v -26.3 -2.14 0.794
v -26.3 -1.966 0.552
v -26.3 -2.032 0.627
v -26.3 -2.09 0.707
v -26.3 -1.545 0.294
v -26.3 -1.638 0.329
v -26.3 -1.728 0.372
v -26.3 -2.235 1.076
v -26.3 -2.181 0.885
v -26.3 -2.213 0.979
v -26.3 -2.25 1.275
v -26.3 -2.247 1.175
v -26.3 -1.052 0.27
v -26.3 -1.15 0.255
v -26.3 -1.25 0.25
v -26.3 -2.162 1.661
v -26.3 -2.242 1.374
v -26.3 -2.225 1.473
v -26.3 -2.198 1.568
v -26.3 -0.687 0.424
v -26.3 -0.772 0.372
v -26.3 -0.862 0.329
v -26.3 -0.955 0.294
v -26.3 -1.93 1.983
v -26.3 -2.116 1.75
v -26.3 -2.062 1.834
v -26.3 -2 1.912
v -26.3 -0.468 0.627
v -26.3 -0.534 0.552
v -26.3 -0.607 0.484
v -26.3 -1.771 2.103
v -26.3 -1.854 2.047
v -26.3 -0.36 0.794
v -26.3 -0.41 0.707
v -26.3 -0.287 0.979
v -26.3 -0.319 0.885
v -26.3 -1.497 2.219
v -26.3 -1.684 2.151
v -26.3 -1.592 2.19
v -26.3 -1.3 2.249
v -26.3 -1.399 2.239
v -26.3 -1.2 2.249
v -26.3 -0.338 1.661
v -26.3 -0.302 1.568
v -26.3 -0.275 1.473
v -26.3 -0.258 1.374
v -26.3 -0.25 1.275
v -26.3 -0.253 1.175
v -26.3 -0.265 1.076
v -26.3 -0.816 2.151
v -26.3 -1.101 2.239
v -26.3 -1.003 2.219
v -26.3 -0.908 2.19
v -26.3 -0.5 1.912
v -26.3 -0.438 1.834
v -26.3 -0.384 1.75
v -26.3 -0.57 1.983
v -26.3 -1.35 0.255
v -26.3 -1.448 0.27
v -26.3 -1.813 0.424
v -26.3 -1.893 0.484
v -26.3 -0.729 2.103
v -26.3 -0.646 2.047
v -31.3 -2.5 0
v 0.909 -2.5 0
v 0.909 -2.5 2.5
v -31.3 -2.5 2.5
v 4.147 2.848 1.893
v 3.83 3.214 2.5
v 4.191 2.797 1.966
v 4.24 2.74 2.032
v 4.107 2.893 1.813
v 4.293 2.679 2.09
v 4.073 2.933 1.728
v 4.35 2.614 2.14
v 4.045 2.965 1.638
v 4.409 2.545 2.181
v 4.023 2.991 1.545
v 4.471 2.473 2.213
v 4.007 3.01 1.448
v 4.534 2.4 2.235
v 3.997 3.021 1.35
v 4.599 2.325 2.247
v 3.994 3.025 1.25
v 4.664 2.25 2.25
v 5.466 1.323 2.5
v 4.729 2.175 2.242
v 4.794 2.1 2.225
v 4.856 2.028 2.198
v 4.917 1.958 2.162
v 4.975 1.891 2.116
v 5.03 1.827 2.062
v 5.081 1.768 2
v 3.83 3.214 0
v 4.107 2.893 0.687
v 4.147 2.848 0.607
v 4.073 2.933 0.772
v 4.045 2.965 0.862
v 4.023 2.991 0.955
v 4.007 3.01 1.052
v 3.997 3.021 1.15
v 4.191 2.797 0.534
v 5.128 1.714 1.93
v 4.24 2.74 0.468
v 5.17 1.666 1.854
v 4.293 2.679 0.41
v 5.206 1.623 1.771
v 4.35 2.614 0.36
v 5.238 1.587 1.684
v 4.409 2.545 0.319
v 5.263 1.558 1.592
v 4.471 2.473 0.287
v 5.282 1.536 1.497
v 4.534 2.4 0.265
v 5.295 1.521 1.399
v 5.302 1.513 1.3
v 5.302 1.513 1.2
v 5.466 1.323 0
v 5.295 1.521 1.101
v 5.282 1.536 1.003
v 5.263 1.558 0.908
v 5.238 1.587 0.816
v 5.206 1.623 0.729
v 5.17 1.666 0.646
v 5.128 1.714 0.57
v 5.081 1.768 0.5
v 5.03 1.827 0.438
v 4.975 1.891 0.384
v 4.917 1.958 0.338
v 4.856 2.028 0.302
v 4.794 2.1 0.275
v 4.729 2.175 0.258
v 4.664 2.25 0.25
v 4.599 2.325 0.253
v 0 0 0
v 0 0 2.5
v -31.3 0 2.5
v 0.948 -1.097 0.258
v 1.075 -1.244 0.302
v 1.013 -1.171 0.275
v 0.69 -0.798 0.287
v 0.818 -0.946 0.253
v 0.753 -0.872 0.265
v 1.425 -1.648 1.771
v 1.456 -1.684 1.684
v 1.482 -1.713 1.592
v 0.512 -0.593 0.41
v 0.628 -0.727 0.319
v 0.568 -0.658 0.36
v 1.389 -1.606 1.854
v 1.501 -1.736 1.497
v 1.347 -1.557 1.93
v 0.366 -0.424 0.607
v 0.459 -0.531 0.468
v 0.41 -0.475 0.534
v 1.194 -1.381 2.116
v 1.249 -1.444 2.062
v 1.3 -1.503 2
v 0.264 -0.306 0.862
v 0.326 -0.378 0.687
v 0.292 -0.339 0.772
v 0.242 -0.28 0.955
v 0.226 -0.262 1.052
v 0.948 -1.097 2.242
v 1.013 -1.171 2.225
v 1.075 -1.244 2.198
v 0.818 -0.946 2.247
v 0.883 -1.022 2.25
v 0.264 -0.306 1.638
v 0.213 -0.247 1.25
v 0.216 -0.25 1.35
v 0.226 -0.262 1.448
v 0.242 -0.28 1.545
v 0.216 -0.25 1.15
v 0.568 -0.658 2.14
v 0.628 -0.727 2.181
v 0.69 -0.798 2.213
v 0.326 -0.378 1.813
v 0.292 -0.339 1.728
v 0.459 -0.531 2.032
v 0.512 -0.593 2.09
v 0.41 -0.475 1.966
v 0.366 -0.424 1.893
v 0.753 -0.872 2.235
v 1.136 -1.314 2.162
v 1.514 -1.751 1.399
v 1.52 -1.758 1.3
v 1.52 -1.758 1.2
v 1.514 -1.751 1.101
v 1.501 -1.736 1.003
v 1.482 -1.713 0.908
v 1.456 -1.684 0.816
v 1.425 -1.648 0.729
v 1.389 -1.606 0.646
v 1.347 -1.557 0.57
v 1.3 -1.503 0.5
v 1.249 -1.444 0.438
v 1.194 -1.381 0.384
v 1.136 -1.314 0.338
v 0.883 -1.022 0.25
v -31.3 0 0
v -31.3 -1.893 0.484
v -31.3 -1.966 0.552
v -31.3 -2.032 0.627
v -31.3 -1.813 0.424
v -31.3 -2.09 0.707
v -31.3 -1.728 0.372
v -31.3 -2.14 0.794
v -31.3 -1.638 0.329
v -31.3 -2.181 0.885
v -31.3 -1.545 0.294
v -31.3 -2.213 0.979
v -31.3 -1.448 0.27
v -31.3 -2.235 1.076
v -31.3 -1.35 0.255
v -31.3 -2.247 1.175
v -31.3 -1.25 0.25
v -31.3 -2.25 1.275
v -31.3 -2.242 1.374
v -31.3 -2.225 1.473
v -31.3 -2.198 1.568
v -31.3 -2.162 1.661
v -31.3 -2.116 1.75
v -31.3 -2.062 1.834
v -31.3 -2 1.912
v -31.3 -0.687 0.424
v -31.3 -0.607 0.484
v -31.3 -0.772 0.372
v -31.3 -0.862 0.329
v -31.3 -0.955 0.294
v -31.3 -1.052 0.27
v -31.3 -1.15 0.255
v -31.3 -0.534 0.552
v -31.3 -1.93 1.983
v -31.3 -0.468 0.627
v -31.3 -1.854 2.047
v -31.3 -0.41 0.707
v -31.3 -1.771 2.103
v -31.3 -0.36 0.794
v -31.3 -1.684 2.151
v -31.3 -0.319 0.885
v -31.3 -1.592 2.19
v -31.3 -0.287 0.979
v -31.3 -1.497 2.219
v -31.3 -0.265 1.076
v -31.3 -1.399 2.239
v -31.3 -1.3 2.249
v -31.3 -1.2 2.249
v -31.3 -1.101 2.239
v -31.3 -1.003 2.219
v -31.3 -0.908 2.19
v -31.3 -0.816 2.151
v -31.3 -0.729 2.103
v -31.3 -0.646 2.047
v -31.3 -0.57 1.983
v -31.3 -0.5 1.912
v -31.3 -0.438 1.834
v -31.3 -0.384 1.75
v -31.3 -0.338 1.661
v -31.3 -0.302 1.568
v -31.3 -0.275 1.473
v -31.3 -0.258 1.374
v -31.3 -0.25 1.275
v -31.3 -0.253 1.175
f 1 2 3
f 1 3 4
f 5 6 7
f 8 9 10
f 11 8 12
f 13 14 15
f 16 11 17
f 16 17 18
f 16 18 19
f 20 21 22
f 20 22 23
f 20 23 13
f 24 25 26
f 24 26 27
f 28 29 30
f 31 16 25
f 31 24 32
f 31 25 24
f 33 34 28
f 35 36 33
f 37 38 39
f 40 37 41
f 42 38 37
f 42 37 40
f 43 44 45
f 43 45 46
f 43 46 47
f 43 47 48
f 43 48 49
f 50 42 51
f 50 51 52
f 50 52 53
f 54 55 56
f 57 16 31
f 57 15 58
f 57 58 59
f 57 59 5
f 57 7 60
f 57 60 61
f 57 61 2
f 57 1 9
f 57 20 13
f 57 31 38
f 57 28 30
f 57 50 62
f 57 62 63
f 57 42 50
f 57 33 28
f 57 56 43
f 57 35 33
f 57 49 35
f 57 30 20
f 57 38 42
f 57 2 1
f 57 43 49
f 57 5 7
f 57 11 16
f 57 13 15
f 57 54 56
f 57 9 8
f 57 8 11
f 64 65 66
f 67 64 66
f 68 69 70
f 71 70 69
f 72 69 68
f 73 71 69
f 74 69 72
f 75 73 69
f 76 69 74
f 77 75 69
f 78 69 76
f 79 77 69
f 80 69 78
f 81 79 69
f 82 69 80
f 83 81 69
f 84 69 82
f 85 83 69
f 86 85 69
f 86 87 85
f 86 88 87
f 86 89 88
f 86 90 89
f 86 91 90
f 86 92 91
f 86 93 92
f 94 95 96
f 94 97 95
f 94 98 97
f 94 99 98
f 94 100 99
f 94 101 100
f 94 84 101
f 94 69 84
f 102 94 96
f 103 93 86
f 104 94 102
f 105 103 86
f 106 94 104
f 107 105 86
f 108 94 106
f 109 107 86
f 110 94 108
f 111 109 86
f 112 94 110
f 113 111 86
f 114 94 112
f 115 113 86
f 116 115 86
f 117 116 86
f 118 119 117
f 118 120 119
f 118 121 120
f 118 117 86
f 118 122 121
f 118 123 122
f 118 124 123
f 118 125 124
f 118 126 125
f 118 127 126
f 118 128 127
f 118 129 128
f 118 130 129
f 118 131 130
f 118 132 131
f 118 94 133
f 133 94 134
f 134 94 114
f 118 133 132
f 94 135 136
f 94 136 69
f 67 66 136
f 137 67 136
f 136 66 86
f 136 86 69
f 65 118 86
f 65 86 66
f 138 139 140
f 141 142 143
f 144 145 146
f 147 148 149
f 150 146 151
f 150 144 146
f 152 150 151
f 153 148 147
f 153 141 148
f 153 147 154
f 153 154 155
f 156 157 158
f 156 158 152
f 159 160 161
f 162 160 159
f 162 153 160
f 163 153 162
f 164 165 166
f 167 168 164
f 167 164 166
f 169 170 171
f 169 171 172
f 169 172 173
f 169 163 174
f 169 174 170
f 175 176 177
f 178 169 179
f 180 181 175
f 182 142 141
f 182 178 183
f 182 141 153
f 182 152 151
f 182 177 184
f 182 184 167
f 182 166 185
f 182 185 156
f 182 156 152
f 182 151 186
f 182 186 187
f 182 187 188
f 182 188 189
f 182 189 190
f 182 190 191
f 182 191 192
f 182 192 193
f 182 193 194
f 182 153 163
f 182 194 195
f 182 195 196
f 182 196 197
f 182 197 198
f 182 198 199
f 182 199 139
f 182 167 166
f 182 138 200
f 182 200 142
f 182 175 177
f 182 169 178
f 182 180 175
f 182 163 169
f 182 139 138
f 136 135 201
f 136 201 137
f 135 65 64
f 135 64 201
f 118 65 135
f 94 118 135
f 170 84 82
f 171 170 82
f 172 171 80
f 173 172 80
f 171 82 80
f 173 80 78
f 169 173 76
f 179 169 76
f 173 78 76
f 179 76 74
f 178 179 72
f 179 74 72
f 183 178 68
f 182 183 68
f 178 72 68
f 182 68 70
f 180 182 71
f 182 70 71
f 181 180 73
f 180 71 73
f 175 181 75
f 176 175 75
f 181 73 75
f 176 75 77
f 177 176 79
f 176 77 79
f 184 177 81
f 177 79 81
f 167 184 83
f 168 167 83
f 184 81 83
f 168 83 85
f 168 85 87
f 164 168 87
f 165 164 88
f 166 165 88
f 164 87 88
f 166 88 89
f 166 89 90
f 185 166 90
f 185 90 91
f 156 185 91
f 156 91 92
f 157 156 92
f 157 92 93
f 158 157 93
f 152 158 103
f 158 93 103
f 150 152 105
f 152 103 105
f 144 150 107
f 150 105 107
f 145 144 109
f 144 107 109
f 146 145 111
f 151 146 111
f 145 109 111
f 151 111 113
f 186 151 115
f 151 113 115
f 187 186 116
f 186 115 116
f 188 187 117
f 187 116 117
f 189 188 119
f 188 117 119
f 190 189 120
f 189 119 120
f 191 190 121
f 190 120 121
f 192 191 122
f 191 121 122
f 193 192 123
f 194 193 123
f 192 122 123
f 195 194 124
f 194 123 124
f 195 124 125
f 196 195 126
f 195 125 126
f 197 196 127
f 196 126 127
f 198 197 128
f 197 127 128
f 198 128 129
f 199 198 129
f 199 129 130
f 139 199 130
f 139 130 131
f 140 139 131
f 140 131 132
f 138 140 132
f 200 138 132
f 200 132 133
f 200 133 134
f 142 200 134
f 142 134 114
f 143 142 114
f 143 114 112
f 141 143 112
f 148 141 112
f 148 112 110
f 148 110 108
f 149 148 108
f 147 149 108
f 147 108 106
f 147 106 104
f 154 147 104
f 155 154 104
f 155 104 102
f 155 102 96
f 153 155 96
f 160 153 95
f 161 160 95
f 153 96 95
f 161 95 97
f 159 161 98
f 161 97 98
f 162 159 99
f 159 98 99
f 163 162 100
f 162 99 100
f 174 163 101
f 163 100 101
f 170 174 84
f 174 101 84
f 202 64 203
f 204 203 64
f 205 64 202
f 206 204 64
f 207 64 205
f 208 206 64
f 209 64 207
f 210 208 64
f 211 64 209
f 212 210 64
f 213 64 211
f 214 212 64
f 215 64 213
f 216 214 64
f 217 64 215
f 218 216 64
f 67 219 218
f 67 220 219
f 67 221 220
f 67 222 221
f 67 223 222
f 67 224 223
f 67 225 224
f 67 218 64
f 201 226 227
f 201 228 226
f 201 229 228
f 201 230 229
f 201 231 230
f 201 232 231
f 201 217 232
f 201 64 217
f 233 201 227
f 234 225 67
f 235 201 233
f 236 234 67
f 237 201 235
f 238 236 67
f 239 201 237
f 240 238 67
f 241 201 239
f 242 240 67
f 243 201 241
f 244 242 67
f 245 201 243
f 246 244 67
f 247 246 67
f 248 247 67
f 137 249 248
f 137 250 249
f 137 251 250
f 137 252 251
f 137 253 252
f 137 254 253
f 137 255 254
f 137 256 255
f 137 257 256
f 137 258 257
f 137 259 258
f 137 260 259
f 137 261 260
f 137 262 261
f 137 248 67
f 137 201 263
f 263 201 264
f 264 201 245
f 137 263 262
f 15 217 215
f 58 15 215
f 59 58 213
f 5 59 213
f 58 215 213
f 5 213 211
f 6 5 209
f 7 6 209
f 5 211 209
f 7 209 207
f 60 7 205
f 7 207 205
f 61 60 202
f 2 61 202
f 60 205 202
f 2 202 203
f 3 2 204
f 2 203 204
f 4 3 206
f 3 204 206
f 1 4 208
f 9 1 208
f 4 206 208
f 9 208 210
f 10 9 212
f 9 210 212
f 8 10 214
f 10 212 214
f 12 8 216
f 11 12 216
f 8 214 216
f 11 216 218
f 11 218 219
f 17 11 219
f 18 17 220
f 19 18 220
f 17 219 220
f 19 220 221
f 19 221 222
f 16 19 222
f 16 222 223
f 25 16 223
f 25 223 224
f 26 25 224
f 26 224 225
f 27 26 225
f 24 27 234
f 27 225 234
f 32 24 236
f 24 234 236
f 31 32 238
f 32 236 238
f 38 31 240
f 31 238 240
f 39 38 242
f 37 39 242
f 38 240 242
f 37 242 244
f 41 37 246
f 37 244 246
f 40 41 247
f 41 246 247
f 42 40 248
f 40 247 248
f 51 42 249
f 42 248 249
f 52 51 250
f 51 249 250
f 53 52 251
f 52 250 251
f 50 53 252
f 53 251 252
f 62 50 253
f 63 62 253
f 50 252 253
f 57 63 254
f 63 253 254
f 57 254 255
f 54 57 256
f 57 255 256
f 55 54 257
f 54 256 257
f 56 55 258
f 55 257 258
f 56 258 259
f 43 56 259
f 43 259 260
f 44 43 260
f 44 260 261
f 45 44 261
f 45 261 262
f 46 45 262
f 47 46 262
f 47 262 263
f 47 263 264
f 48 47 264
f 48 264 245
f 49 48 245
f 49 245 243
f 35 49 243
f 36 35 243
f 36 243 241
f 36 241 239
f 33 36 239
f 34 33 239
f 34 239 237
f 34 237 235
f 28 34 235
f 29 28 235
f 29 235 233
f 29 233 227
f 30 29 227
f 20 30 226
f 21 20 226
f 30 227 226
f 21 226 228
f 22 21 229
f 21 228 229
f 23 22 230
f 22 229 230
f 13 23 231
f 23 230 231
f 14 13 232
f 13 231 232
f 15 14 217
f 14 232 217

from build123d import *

# Parameters (mm, degrees)
BOSS_EXTRUDE1_DEPTH = 2.5
SKETCH2_R           = 1
CUT_EXTRUDE1_DEPTH  = 5
SKETCH3_R           = 1
CUT_EXTRUDE2_DEPTH  = 5
SKETCH4_R           = 1
BOSS_EXTRUDE2_DEPTH = 5
SKETCH6_W           = 2.5
SKETCH6_H           = 2.5
BOSS_EXTRUDE3_DEPTH = 25
SKETCH7_R           = 1
CUT_EXTRUDE3_DEPTH  = 5
SKETCH8_W           = 8
SKETCH8_H           = 2.5
CUT_EXTRUDE4_DEPTH  = 10
SKETCH9_R           = 1
CUT_EXTRUDE5_DEPTH  = 5
SKETCH10_R          = 1
BOSS_EXTRUDE4_DEPTH = 5
SKETCH11_W          = 2.5
SKETCH11_H          = 2.5
BOSS_EXTRUDE5_DEPTH = 1
SKETCH12_W          = 2.5
SKETCH12_H          = 2.5
BOSS_EXTRUDE6_DEPTH = 1
SKETCH13_W          = 2.5
SKETCH13_H          = 2.5
CUT_EXTRUDE6_DEPTH  = 1
CUT_EXTRUDE7_DEPTH  = 5


with BuildPart() as part:
    # Sketch1 → Boss-Extrude1 (new body)
    with BuildSketch(Plane.XY):
        Polygon((-13.3, 0), (0, 0), (3.830222216, 3.213938048), (5.465982834, 1.323359513), (0.909480399, -2.5), (-13.3, -2.5), align=None)
    extrude(amount=BOSS_EXTRUDE1_DEPTH)

    # Sketch2 → Cut-Extrude1 (cut)
    with BuildSketch(Plane(origin=(3.780724263, 3.271146765, 0), x_dir=(0, 0, -1), z_dir=(0.7562314141303861, 0.6543042474891605, 0))):
        with Locations(Location((-1.25, -1.325649749, 0), (0, 0, 90))):
            Circle(SKETCH2_R)
    extrude(amount=-CUT_EXTRUDE1_DEPTH, mode=Mode.SUBTRACT)

    # Sketch3 → Cut-Extrude2 (cut)
    with BuildSketch(Plane.ZY.offset(13.3)):
        with Locations((1.25, -1.25)):
            Circle(SKETCH3_R)
    extrude(amount=-CUT_EXTRUDE2_DEPTH, mode=Mode.SUBTRACT)

    # Sketch4 → Boss-Extrude2 (add)
    with BuildSketch(Plane.ZY.offset(13.3)):
        with Locations((1.25, -1.25)):
            Circle(SKETCH4_R)
    extrude(amount=-BOSS_EXTRUDE2_DEPTH)

    # Sketch6 → Boss-Extrude3 (add)
    with BuildSketch(Plane.ZY.offset(13.3)):
        with Locations((1.25, -1.25)):
            Rectangle(SKETCH6_W, SKETCH6_H)
    extrude(amount=BOSS_EXTRUDE3_DEPTH)

    # Sketch7 → Cut-Extrude3 (cut)
    with BuildSketch(Plane.ZY.offset(38.3)):
        with Locations((1.25, -1.25)):
            Circle(SKETCH7_R)
    extrude(amount=-CUT_EXTRUDE3_DEPTH, mode=Mode.SUBTRACT)

    # Sketch8 → Cut-Extrude4 (cut)
    with BuildSketch(Plane(origin=(0, 0, 0), x_dir=(-1, 0, 0), z_dir=(0, 0, -1))):
        with Locations((34.3, -1.25)):
            Rectangle(SKETCH8_W, SKETCH8_H)
    extrude(amount=-CUT_EXTRUDE4_DEPTH, mode=Mode.SUBTRACT)

    # Sketch9 → Cut-Extrude5 (cut)
    with BuildSketch(Plane.ZY.offset(30.3)):
        with Locations((1.25, -1.25)):
            Circle(SKETCH9_R)
    extrude(amount=-CUT_EXTRUDE5_DEPTH, mode=Mode.SUBTRACT)

    # Sketch10 → Boss-Extrude4 (add)
    with BuildSketch(Plane.ZY.offset(30.3)):
        with Locations((1.25, -1.25)):
            Circle(SKETCH10_R)
    extrude(amount=-BOSS_EXTRUDE4_DEPTH)

    # Sketch11 → Boss-Extrude5 (add)
    with BuildSketch(Plane.ZY.offset(30.3)):
        with Locations((1.25, -1.25)):
            Rectangle(SKETCH11_W, SKETCH11_H)
    extrude(amount=BOSS_EXTRUDE5_DEPTH)

    # Sketch12 → Boss-Extrude6 (add)
    with BuildSketch(Plane.ZY.offset(31.3)):
        with Locations((1.25, -1.25)):
            Rectangle(SKETCH12_W, SKETCH12_H)
    extrude(amount=BOSS_EXTRUDE6_DEPTH)

    # Sketch13 → Cut-Extrude6 (cut)
    with BuildSketch(Plane.ZY.offset(32.3)):
        with Locations((1.25, -1.25)):
            Rectangle(SKETCH13_W, SKETCH13_H)
    extrude(amount=-CUT_EXTRUDE6_DEPTH, mode=Mode.SUBTRACT)

    # Sketch14 → Cut-Extrude7 (cut)
    with BuildSketch(Plane.ZY.offset(31.3)):
        with BuildLine():
            ThreePointArc((2.25, -1.25), (1.25, -0.25), (0.25, -1.25))
            Line((0.25, -1.25), (2.25, -1.25))
        make_face()
        with BuildLine():
            Line((2.25, -1.25), (0.25, -1.25))
            ThreePointArc((0.25, -1.25), (1.25, -2.25), (2.25, -1.25))
        make_face()
    extrude(amount=-CUT_EXTRUDE7_DEPTH, mode=Mode.SUBTRACT)


solid = part.part
